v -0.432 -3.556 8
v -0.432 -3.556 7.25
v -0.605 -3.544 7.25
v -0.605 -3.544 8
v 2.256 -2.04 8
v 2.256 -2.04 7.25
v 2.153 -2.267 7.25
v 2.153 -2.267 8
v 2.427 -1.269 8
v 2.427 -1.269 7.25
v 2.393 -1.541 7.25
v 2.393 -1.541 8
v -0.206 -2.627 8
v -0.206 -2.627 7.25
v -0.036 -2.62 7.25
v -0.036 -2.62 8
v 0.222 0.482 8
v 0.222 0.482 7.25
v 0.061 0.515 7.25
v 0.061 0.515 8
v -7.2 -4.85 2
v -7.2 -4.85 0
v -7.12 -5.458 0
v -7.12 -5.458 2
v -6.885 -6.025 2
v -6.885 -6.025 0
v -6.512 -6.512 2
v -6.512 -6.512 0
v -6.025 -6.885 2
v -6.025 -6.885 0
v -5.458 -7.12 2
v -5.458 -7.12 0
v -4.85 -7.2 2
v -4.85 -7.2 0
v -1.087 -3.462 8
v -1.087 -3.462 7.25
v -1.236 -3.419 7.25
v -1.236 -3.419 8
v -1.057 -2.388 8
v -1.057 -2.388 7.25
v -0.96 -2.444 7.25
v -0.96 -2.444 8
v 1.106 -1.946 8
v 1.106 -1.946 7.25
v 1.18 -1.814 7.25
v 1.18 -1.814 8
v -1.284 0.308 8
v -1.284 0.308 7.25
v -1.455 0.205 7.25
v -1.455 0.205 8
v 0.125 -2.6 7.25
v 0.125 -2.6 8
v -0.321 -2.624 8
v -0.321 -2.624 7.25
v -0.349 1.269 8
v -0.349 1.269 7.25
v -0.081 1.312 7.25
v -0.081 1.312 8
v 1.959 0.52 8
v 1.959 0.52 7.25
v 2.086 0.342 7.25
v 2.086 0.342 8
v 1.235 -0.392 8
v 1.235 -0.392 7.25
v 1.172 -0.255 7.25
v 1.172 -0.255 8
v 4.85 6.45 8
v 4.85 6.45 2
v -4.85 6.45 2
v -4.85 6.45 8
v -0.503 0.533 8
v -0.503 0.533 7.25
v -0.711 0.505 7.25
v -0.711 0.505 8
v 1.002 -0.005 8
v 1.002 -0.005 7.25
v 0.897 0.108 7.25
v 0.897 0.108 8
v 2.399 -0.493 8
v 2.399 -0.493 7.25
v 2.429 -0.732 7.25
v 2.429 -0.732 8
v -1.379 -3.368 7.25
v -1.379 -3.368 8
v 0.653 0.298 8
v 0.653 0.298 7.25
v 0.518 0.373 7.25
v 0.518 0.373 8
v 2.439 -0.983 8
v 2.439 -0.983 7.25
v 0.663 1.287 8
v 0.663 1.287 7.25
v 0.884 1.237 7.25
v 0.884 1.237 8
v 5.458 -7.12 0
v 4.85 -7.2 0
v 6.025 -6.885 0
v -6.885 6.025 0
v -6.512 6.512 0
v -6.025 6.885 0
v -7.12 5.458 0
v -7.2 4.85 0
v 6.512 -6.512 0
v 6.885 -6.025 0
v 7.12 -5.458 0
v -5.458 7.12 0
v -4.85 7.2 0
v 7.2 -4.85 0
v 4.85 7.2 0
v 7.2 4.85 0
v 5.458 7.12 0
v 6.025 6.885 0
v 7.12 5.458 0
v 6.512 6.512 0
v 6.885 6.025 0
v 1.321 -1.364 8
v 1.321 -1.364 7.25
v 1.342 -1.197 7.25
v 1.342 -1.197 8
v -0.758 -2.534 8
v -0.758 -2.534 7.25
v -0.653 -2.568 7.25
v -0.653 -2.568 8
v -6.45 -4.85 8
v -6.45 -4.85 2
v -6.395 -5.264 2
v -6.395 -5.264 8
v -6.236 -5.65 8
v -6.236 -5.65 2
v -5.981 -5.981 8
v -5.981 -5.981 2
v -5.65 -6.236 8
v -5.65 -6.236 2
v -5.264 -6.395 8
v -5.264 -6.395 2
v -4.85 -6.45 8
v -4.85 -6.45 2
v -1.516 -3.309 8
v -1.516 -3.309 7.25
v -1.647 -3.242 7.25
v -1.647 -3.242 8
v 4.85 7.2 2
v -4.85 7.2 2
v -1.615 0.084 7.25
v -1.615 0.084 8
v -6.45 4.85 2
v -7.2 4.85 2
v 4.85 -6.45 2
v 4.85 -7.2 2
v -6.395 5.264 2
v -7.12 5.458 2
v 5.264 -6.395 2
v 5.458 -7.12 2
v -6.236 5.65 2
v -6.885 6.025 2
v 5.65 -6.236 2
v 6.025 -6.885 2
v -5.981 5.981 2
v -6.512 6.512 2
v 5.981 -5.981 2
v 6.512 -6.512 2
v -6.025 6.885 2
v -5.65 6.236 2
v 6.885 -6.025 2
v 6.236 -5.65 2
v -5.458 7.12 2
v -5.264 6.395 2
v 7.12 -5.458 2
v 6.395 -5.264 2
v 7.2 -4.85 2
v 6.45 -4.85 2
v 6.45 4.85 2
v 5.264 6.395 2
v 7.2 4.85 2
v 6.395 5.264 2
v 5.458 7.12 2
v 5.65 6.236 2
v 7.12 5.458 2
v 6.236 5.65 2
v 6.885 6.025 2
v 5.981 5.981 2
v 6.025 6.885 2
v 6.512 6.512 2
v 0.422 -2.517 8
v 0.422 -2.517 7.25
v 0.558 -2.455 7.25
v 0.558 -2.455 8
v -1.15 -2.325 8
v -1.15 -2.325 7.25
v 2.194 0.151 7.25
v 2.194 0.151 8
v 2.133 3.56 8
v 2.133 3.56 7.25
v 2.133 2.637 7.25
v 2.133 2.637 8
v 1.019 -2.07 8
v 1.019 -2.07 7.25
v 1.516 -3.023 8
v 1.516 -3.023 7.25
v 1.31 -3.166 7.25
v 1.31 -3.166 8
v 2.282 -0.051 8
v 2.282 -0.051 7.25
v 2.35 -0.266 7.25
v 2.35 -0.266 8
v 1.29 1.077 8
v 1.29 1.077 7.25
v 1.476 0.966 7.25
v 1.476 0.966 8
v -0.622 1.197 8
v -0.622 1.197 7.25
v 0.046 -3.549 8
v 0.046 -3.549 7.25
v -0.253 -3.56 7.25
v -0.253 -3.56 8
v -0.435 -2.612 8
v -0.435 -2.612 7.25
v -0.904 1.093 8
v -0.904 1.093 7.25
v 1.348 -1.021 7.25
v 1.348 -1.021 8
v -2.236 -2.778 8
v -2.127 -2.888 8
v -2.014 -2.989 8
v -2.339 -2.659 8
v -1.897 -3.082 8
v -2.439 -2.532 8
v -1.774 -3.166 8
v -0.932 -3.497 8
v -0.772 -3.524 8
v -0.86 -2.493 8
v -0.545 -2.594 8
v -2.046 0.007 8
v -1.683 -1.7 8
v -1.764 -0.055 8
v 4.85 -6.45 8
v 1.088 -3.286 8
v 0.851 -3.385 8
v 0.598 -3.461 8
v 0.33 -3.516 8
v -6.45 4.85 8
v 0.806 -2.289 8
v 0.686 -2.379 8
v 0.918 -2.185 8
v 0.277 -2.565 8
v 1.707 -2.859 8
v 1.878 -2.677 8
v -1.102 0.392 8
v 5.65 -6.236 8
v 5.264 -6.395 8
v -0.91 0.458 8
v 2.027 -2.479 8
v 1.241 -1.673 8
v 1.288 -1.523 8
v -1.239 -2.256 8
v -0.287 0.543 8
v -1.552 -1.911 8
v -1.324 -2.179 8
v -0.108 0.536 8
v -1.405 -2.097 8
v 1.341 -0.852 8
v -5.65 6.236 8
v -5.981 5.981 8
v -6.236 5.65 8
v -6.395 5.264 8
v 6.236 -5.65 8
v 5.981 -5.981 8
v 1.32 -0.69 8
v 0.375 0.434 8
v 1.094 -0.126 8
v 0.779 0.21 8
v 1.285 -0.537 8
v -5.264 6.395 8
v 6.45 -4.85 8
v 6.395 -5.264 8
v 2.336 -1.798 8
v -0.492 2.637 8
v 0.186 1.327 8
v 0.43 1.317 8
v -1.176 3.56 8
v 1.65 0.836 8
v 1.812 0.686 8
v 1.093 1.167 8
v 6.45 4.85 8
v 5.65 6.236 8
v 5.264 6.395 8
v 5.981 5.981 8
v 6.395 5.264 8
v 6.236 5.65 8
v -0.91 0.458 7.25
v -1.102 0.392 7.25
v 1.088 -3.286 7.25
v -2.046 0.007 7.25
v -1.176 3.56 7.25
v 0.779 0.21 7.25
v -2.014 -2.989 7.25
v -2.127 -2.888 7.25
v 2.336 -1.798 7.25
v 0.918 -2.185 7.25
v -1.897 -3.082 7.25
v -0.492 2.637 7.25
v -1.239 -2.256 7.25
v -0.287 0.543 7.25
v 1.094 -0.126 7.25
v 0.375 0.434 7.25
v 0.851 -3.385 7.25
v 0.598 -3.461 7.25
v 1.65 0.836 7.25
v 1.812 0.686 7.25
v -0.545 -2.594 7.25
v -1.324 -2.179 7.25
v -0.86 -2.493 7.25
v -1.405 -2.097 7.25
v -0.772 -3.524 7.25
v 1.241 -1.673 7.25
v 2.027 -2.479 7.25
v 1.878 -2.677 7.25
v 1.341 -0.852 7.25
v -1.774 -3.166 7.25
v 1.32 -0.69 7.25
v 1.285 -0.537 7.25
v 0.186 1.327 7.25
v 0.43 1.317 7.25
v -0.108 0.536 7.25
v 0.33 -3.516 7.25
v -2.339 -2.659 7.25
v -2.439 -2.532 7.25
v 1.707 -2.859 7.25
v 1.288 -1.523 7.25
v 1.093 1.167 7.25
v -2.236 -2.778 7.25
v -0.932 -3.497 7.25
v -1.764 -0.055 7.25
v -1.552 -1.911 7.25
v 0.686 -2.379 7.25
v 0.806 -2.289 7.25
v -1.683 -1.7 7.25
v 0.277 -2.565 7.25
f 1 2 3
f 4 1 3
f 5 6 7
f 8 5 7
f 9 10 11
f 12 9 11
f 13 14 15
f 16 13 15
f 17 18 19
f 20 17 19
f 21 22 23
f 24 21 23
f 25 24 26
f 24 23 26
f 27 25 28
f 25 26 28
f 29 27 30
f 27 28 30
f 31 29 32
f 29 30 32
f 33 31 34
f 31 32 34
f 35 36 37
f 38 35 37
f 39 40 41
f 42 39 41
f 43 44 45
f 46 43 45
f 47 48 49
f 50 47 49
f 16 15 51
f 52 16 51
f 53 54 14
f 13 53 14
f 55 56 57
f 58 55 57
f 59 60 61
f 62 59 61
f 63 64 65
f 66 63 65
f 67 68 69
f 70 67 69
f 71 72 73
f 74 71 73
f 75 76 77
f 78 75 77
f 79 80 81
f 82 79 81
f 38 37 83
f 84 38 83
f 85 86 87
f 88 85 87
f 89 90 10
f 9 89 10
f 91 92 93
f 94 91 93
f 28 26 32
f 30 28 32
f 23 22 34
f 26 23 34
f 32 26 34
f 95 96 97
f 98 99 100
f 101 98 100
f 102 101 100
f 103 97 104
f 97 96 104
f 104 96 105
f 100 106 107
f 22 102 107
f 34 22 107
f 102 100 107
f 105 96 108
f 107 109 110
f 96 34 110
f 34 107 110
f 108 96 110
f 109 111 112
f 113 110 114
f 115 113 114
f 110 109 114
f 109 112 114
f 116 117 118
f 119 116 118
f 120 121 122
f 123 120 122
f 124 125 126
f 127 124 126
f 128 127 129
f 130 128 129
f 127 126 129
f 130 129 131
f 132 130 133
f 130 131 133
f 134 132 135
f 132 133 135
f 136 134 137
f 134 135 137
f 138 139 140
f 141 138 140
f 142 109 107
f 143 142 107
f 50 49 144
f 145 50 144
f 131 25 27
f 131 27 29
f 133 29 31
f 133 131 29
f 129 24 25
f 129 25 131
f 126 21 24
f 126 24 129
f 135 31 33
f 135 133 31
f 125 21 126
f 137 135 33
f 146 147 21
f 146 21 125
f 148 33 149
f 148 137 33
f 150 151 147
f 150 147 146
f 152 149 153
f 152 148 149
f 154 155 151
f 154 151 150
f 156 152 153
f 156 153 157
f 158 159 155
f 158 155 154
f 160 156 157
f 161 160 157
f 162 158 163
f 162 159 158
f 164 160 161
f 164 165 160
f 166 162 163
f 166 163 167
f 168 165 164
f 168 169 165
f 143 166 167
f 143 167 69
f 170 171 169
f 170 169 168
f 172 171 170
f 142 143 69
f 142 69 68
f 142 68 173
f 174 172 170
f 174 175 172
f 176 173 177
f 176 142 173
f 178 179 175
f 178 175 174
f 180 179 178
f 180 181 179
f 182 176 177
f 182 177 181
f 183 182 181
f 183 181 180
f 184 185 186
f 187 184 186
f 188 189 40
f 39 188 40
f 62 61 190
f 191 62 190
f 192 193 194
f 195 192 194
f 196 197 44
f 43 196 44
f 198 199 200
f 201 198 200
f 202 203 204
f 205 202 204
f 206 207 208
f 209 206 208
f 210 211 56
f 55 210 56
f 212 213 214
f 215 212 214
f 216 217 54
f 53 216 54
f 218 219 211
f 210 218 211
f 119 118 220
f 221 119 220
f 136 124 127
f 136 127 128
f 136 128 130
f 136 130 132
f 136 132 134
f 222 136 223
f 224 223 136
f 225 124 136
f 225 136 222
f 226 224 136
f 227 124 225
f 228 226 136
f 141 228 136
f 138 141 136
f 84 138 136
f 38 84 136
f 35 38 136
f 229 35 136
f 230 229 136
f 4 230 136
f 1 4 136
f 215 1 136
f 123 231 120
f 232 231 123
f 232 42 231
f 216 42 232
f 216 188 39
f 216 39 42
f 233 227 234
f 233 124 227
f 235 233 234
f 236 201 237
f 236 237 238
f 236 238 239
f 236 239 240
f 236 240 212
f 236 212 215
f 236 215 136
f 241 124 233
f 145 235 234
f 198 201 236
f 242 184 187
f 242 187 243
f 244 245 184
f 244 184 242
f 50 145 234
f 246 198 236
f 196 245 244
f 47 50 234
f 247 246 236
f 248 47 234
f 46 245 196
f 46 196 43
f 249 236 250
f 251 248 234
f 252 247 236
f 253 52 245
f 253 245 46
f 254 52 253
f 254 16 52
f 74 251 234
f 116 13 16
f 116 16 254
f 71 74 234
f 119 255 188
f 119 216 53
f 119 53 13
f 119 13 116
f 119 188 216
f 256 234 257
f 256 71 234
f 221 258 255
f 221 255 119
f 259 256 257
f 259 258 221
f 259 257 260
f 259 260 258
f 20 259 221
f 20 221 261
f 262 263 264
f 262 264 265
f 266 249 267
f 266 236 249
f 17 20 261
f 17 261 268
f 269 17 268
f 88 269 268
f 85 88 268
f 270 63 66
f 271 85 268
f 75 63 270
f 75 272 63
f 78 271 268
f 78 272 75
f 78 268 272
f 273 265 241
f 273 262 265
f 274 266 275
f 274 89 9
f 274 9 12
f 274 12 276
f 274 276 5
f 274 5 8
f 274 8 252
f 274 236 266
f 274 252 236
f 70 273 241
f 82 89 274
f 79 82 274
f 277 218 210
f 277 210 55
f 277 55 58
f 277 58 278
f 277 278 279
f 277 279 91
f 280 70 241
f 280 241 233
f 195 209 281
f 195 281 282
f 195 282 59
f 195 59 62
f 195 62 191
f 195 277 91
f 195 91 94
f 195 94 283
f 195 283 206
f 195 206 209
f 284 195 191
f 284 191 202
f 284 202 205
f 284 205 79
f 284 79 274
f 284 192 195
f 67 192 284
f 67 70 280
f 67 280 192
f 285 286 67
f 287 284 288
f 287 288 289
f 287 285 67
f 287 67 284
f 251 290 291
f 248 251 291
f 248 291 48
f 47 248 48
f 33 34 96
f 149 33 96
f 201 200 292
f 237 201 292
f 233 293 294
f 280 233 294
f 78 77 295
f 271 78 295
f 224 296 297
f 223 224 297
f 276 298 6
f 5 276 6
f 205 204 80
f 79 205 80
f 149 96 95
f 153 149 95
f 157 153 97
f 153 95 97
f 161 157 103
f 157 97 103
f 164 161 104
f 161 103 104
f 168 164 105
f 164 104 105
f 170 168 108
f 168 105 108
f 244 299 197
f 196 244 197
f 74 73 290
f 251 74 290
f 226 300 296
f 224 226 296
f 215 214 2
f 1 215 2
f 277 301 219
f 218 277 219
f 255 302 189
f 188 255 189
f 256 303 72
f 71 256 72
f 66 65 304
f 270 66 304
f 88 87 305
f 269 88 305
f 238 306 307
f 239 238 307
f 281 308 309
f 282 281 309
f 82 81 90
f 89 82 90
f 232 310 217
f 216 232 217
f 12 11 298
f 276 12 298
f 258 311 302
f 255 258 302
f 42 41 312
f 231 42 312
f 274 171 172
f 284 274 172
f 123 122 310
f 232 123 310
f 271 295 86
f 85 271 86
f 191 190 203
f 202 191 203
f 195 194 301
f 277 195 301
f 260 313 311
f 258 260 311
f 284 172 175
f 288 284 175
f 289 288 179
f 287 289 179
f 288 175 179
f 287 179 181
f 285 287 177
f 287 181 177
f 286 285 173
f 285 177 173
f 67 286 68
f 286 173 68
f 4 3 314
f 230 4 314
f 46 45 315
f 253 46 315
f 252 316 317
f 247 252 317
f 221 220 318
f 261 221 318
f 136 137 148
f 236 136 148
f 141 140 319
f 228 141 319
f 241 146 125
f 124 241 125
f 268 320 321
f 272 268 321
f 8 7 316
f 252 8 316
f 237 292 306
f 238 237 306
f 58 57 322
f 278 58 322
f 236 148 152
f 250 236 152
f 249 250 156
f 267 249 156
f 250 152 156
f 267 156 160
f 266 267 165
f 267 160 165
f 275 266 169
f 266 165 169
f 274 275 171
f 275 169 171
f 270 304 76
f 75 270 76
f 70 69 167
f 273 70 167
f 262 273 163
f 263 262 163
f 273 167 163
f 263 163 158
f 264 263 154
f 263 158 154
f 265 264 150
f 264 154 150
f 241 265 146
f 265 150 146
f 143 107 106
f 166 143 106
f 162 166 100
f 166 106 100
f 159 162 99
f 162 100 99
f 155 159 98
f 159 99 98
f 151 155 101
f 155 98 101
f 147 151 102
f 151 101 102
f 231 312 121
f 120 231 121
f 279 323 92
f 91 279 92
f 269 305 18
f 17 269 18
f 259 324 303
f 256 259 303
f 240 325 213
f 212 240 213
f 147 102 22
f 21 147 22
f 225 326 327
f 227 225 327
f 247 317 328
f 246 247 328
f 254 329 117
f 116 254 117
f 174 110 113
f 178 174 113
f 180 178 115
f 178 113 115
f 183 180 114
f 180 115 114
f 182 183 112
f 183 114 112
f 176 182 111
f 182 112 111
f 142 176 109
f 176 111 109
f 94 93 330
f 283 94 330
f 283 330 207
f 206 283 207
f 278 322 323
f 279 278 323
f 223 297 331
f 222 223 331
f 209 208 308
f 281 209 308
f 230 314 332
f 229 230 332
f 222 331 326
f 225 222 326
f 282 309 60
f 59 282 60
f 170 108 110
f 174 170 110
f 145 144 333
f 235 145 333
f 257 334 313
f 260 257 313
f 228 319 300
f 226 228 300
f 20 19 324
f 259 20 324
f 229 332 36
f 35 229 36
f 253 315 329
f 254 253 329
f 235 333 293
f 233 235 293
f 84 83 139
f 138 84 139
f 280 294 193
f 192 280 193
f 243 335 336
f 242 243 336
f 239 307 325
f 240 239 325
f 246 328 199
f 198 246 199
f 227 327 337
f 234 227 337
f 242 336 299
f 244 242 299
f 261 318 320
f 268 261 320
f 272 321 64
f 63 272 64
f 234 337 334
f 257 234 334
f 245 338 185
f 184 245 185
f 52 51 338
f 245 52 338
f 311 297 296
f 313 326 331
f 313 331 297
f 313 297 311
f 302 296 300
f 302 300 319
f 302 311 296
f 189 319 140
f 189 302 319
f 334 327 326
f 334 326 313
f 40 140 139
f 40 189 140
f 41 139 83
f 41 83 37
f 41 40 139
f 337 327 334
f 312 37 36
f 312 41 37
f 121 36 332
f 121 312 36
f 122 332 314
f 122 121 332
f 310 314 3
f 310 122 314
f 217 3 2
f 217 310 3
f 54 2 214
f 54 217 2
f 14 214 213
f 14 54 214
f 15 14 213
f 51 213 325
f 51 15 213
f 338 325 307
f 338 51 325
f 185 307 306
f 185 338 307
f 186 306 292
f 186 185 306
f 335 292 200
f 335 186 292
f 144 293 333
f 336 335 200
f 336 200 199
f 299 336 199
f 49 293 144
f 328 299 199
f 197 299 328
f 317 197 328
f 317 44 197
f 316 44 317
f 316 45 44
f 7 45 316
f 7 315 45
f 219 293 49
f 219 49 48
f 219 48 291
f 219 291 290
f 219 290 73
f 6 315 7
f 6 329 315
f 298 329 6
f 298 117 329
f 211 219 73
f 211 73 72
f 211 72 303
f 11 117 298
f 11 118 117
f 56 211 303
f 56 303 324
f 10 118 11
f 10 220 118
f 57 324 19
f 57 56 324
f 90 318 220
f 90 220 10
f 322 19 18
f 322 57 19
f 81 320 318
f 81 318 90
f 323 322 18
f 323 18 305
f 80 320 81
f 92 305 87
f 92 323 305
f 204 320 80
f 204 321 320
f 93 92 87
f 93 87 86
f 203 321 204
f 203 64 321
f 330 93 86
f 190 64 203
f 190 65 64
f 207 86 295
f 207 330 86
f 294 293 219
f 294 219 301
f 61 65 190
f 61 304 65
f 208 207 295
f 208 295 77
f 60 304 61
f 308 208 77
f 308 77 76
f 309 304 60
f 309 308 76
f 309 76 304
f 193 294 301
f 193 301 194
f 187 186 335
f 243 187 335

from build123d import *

# Parameters (mm, degrees)
F1_DEPTH = 2
F2_DEPTH = 8
F3_DEPTH = 7.25


with BuildPart() as f1:
    # F0 (on Top) → F1 (new body)
    with BuildSketch(Plane.XY):
        with BuildLine():
            Line((4.85, 7.2), (-4.85, 7.2))
            ThreePointArc((-4.85, 7.2), (-6.511701, 6.511701), (-7.2, 4.85))
            Line((-7.2, 4.85), (-7.2, -4.85))
            ThreePointArc((-7.2, -4.85), (-6.511701, -6.511701), (-4.85, -7.2))
            Line((-4.85, -7.2), (4.85, -7.2))
            ThreePointArc((4.85, -7.2), (6.511701, -6.511701), (7.2, -4.85))
            Line((7.2, -4.85), (7.2, 4.85))
            ThreePointArc((7.2, 4.85), (6.511701, 6.511701), (4.85, 7.2))
        make_face()
        with BuildLine():
            ThreePointArc((6.45, -4.85), (5.981371, -5.981371), (4.85, -6.45))
            Line((4.85, -6.45), (-4.85, -6.45))
            ThreePointArc((-4.85, -6.45), (-5.981371, -5.981371), (-6.45, -4.85))
            Line((-6.45, -4.85), (-6.45, 4.85))
            ThreePointArc((-6.45, 4.85), (-5.981371, 5.981371), (-4.85, 6.45))
            Line((-4.85, 6.45), (4.85, 6.45))
            ThreePointArc((4.85, 6.45), (5.981371, 5.981371), (6.45, 4.85))
            Line((6.45, 4.85), (6.45, -4.85))
        make_face(mode=Mode.SUBTRACT)
    extrude(amount=F1_DEPTH)

    # F0 (on Top) → F2 (join)
    with BuildSketch(Plane.XY):
        with BuildLine():
            Line((-4.85, -6.45), (4.85, -6.45))
            ThreePointArc((4.85, -6.45), (5.981371, -5.981371), (6.45, -4.85))
            Line((6.45, -4.85), (6.45, 4.85))
            ThreePointArc((6.45, 4.85), (5.981371, 5.981371), (4.85, 6.45))
            Line((4.85, 6.45), (-4.85, 6.45))
            ThreePointArc((-4.85, 6.45), (-5.981371, 5.981371), (-6.45, 4.85))
            Line((-6.45, 4.85), (-6.45, -4.85))
            ThreePointArc((-6.45, -4.85), (-5.981371, -5.981371), (-4.85, -6.45))
        make_face()
        Polygon((-2.438525, -2.531762), (-1.68306, -1.699795), (-1.552468, -1.911373), (-1.404542, -2.096653), (-1.32408, -2.179431), (-1.239284, -2.255635), (-1.150156, -2.325265), (-1.056694, -2.38832), (-0.959721, -2.444352), (-0.860058, -2.492913), (-0.757706, -2.534004), (-0.652664, -2.567623), (-0.544933, -2.593771), (-0.434512, -2.612449), (-0.321401, -2.623655), (-0.205601, -2.627391), (-0.036384, -2.62048), (0.124616, -2.599748), (0.277397, -2.565195), (0.42196, -2.51682), (0.558306, -2.454625), (0.686433, -2.378607), (0.806342, -2.288769), (0.918033, -2.185109), (1.018891, -2.070168), (1.106301, -1.946487), (1.180264, -1.814064), (1.240779, -1.6729), (1.287846, -1.522995), (1.321465, -1.364349), (1.341637, -1.196961), (1.348361, -1.020833), (1.341301, -0.851541), (1.32012, -0.690318), (1.28482, -0.537163), (1.2354, -0.392077), (1.171859, -0.255059), (1.094198, -0.12611), (1.002417, -0.00523), (0.896516, 0.107582), (0.779185, 0.209561), (0.653112, 0.297942), (0.518299, 0.372727), (0.374744, 0.433914), (0.222448, 0.481504), (0.061411, 0.515497), (-0.108366, 0.535893), (-0.286885, 0.542691), (-0.502796, 0.533278), (-0.710639, 0.505038), (-0.910412, 0.45797), (-1.102117, 0.392077), (-1.28426, 0.307655), (-1.455345, 0.205003), (-1.615373, 0.084123), (-1.764344, -0.054986), (-2.046448, 0.007172), (-1.17623, 3.559768), (2.132514, 3.559768), (2.132514, 2.636954), (-0.492486, 2.636954), (-0.903689, 1.092555), (-0.621585, 1.196551), (-0.349044, 1.269467), (-0.081284, 1.3125), (0.186475, 1.326844), (0.430477, 1.316833), (0.662824, 1.2868), (0.883517, 1.236744), (1.092555, 1.166667), (1.289938, 1.076567), (1.475666, 0.966445), (1.64974, 0.8363), (1.812158, 0.686134), (1.958963, 0.519905), (2.086194, 0.341573), (2.19385, 0.151138), (2.281933, -0.0514), (2.350442, -0.266041), (2.399377, -0.492785), (2.428738, -0.731632), (2.438525, -0.982582), (2.427094, -1.269206), (2.392802, -1.540962), (2.335649, -1.797852), (2.255635, -2.039874), (2.15276, -2.267028), (2.027024, -2.479316), (1.878426, -2.676736), (1.706967, -2.85929), (1.516308, -3.023464), (1.310109, -3.165749), (1.088371, -3.286143), (0.851093, -3.384648), (0.598275, -3.461263), (0.329918, -3.515988), (0.046021, -3.548823), (-0.253415, -3.559768), (-0.432121, -3.555846), (-0.60485, -3.544079), (-0.771602, -3.524467), (-0.932377, -3.497012), (-1.087176, -3.461711), (-1.235997, -3.418566), (-1.378842, -3.367577), (-1.51571, -3.308743), (-1.647274, -3.241691), (-1.774206, -3.166048), (-1.896506, -3.081812), (-2.014173, -2.988986), (-2.127209, -2.887567), (-2.235613, -2.777557), (-2.339385, -2.658956), align=None, mode=Mode.SUBTRACT)
    extrude(amount=F2_DEPTH)

    # F0 (on Top) → F3 (join)
    with BuildSketch(Plane.XY):
        Polygon((-1.552468, -1.911373), (-1.68306, -1.699795), (-2.438525, -2.531762), (-2.339385, -2.658956), (-2.235613, -2.777557), (-2.127209, -2.887567), (-2.014173, -2.988986), (-1.896506, -3.081812), (-1.774206, -3.166048), (-1.647274, -3.241691), (-1.51571, -3.308743), (-1.378842, -3.367577), (-1.235997, -3.418566), (-1.087176, -3.461711), (-0.932377, -3.497012), (-0.771602, -3.524467), (-0.60485, -3.544079), (-0.432121, -3.555846), (-0.253415, -3.559768), (0.046021, -3.548823), (0.329918, -3.515988), (0.598275, -3.461263), (0.851093, -3.384648), (1.088371, -3.286143), (1.310109, -3.165749), (1.516308, -3.023464), (1.706967, -2.85929), (1.878426, -2.676736), (2.027024, -2.479316), (2.15276, -2.267028), (2.255635, -2.039874), (2.335649, -1.797852), (2.392802, -1.540962), (2.427094, -1.269206), (2.438525, -0.982582), (2.428738, -0.731632), (2.399377, -0.492785), (2.350442, -0.266041), (2.281933, -0.0514), (2.19385, 0.151138), (2.086194, 0.341573), (1.958963, 0.519905), (1.812158, 0.686134), (1.64974, 0.8363), (1.475666, 0.966445), (1.289938, 1.076567), (1.092555, 1.166667), (0.883517, 1.236744), (0.662824, 1.2868), (0.430477, 1.316833), (0.186475, 1.326844), (-0.081284, 1.3125), (-0.349044, 1.269467), (-0.621585, 1.196551), (-0.903689, 1.092555), (-0.492486, 2.636954), (2.132514, 2.636954), (2.132514, 3.559768), (-1.17623, 3.559768), (-2.046448, 0.007172), (-1.764344, -0.054986), (-1.615373, 0.084123), (-1.455345, 0.205003), (-1.28426, 0.307655), (-1.102117, 0.392077), (-0.910412, 0.45797), (-0.710639, 0.505038), (-0.502796, 0.533278), (-0.286885, 0.542691), (-0.108366, 0.535893), (0.061411, 0.515497), (0.222448, 0.481504), (0.374744, 0.433914), (0.518299, 0.372727), (0.653112, 0.297942), (0.779185, 0.209561), (0.896516, 0.107582), (1.002417, -0.00523), (1.094198, -0.12611), (1.171859, -0.255059), (1.2354, -0.392077), (1.28482, -0.537163), (1.32012, -0.690318), (1.341301, -0.851541), (1.348361, -1.020833), (1.341637, -1.196961), (1.321465, -1.364349), (1.287846, -1.522995), (1.240779, -1.6729), (1.180264, -1.814064), (1.106301, -1.946487), (1.018891, -2.070168), (0.918033, -2.185109), (0.806342, -2.288769), (0.686433, -2.378607), (0.558306, -2.454625), (0.42196, -2.51682), (0.277397, -2.565195), (0.124616, -2.599748), (-0.036384, -2.62048), (-0.205601, -2.627391), (-0.321401, -2.623655), (-0.434512, -2.612449), (-0.544933, -2.593771), (-0.652664, -2.567623), (-0.757706, -2.534004), (-0.860058, -2.492913), (-0.959721, -2.444352), (-1.056694, -2.38832), (-1.150156, -2.325265), (-1.239284, -2.255635), (-1.32408, -2.179431), (-1.404542, -2.096653), align=None)
    extrude(amount=F3_DEPTH)


solid = f1.part
